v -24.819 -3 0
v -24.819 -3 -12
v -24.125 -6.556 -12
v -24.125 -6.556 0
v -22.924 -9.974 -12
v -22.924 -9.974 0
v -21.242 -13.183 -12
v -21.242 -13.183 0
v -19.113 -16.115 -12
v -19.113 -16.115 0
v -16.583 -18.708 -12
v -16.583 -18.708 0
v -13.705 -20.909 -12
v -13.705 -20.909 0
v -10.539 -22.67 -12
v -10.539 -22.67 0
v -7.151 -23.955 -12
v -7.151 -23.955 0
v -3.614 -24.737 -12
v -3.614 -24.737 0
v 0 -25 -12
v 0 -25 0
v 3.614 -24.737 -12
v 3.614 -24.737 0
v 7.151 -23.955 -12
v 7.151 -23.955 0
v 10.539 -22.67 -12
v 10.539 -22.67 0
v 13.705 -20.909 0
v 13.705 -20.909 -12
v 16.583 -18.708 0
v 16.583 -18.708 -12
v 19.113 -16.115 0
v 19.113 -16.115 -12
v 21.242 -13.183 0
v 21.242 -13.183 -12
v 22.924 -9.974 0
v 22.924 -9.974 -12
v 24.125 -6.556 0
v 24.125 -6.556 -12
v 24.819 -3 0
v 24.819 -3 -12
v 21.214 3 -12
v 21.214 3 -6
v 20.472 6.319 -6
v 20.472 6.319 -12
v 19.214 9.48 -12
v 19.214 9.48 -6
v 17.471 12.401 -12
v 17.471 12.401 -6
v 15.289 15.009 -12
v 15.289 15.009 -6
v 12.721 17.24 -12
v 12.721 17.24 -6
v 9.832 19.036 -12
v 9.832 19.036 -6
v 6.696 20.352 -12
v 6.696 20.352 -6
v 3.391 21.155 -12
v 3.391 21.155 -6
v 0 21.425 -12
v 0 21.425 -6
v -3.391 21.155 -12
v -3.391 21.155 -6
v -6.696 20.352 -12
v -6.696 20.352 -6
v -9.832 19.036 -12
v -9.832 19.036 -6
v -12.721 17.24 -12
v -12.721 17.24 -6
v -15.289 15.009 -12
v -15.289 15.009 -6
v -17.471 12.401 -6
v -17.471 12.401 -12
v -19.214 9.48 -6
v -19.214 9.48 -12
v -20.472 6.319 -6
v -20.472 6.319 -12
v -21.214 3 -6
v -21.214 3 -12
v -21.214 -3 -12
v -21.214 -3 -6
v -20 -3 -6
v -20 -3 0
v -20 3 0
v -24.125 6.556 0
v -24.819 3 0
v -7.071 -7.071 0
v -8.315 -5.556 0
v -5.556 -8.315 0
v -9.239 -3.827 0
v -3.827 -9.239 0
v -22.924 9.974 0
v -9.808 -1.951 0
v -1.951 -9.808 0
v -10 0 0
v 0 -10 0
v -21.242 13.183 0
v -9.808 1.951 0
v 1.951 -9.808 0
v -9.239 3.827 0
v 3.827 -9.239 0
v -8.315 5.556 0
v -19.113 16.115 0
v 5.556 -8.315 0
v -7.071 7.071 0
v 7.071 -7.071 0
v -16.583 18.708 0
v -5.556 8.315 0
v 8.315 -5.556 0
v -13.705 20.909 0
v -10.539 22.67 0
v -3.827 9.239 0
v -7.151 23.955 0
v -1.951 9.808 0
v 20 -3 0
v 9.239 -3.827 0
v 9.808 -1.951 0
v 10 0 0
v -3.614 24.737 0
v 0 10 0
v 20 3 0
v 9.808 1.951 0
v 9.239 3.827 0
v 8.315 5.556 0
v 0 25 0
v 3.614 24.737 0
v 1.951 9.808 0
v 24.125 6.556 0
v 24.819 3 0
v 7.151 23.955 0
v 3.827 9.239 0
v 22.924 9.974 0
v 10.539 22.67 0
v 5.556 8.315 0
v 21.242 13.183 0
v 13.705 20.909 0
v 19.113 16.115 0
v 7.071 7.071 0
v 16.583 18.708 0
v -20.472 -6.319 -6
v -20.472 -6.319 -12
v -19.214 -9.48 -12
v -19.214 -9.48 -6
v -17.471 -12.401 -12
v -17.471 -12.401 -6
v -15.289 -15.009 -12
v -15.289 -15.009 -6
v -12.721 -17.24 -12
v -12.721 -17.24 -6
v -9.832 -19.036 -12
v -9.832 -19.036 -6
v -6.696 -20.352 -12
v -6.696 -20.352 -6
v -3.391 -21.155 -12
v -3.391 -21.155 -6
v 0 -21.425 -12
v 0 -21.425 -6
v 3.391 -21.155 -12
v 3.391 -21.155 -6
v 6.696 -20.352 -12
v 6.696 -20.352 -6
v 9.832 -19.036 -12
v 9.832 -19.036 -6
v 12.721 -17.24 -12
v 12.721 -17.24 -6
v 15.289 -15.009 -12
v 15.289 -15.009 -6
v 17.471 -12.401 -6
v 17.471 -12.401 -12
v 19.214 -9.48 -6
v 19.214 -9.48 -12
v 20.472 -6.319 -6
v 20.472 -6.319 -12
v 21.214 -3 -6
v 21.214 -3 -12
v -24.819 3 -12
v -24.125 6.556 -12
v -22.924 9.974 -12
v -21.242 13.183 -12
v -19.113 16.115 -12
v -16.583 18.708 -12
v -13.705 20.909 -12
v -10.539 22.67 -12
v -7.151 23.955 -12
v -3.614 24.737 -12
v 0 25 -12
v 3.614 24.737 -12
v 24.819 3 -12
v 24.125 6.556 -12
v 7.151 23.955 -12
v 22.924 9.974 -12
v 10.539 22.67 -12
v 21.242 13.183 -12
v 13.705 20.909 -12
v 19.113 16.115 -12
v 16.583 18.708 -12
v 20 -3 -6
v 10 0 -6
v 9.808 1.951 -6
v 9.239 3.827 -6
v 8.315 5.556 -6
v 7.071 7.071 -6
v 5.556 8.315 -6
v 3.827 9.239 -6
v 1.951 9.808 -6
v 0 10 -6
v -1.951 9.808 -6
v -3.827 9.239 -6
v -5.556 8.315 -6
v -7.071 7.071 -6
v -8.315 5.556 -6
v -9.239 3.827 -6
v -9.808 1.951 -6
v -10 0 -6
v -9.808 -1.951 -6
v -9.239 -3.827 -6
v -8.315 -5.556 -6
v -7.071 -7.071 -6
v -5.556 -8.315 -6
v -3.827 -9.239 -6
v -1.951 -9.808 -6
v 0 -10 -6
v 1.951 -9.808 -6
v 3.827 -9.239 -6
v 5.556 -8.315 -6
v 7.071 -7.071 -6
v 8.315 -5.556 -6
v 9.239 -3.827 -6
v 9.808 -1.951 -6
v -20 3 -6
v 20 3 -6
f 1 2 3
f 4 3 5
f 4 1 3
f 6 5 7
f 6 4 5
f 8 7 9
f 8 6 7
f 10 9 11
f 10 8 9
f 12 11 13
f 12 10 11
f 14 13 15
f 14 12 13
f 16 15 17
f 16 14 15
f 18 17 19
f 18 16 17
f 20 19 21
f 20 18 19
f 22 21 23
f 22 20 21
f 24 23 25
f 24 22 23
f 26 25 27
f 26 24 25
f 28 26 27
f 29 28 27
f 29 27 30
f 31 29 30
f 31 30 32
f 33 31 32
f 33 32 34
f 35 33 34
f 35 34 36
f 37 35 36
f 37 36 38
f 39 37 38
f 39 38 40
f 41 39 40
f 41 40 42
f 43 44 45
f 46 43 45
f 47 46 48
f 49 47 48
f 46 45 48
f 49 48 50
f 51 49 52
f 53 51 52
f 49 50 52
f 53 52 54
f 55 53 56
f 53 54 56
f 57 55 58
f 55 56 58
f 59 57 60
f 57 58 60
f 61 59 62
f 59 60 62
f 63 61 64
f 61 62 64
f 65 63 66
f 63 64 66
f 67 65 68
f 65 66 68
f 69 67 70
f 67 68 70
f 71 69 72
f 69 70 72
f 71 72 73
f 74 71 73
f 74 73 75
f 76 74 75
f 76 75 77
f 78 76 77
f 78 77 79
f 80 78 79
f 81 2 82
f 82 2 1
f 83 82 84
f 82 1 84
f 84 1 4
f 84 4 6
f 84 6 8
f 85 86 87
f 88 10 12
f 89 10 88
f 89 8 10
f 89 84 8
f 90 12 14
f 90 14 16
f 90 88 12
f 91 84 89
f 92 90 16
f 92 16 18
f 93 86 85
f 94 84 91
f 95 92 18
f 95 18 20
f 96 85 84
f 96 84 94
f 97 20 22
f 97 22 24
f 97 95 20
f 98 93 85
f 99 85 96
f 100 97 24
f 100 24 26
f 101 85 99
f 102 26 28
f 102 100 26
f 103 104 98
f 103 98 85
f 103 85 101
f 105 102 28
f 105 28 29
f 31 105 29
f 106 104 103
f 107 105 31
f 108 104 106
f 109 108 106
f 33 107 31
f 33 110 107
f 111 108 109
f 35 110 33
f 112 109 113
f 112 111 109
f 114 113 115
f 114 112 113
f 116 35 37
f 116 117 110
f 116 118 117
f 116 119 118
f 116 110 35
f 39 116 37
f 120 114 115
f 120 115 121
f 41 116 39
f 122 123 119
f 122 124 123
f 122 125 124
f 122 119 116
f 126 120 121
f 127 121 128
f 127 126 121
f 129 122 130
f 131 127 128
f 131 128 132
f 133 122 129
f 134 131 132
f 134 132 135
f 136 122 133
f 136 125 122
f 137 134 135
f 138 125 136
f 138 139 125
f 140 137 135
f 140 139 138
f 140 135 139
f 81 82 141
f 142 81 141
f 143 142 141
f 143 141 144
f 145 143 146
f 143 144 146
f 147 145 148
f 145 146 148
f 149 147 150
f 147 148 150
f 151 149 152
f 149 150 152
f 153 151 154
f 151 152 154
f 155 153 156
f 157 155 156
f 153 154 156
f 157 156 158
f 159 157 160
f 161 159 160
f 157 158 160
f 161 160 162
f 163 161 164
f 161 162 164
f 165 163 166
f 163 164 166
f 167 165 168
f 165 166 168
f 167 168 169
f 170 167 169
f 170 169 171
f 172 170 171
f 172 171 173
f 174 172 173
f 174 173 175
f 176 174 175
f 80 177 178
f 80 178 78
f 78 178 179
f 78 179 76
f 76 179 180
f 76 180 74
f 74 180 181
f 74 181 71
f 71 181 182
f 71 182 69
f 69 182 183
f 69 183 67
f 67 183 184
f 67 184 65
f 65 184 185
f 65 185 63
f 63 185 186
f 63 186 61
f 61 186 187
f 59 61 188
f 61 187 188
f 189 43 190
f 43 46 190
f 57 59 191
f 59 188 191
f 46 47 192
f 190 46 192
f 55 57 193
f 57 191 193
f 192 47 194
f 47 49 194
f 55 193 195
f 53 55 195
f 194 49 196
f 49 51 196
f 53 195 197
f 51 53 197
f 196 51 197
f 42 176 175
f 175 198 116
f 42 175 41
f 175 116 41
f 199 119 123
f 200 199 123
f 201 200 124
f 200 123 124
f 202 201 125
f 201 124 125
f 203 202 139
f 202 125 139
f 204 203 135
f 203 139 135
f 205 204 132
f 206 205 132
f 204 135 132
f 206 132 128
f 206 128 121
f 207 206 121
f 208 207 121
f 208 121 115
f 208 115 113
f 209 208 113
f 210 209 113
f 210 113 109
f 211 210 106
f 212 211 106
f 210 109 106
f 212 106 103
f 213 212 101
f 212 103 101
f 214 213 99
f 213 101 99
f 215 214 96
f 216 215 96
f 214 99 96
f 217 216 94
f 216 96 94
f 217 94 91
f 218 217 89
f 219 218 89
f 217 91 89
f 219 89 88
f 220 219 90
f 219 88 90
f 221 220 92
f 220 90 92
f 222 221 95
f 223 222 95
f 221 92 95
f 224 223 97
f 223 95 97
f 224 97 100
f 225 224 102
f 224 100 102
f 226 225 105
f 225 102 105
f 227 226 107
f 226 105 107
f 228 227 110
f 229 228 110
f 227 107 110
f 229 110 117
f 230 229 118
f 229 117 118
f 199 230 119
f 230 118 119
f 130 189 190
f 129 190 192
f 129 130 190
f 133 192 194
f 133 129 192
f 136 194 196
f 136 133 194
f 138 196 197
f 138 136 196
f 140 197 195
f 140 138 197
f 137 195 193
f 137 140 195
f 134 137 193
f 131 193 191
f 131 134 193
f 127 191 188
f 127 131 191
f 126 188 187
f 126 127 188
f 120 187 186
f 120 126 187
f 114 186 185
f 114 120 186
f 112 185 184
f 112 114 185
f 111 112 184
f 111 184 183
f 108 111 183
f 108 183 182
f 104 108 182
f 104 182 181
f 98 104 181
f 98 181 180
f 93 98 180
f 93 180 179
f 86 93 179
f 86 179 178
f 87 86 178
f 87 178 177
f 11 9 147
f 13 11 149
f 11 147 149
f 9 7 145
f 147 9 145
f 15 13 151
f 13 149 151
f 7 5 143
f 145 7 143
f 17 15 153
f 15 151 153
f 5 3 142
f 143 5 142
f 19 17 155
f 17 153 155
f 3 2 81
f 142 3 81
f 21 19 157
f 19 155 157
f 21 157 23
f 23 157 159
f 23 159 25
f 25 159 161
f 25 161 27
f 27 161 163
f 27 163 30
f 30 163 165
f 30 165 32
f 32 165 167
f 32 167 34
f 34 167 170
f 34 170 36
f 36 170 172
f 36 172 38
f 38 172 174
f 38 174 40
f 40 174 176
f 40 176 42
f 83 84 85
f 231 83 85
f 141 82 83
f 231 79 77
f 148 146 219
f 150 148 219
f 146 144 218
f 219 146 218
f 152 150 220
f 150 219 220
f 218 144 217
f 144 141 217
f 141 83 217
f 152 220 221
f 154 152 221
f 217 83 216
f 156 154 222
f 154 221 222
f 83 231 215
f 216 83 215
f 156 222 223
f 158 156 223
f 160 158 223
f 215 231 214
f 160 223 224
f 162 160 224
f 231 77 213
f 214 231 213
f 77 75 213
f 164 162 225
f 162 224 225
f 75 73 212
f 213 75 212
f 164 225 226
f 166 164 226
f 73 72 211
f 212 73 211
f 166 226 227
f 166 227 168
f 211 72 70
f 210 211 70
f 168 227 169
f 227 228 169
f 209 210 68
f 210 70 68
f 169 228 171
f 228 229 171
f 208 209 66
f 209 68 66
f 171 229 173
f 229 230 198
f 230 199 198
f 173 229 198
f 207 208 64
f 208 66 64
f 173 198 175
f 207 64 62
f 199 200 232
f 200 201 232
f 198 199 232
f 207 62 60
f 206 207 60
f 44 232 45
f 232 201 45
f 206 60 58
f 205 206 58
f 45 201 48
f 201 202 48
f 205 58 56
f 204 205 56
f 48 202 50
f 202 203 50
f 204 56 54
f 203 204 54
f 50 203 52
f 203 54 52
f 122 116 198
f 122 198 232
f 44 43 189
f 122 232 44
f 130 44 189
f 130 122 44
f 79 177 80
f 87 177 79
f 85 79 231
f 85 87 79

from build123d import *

# Parameters (mm, degrees)
F0_R     = 21.4249
F0_R_2   = 15
F0_R_3   = 10
F1_DEPTH = 6
F0_R_4   = 25
F2_DEPTH = 12
F4_W     = 10
F4_H     = 6
F5_DEPTH = 25


with BuildPart() as f1:
    # F0 (on Top) → F1 (new body)
    with BuildSketch(Plane.XY):
        Circle(F0_R)
        Circle(F0_R_2, mode=Mode.SUBTRACT)
        Circle(F0_R_2)
        Circle(F0_R_3, mode=Mode.SUBTRACT)
    extrude(amount=-F1_DEPTH)

    # F0 (on Top) → F2 (join)
    with BuildSketch(Plane.XY):
        Circle(F0_R_4)
        Circle(F0_R, mode=Mode.SUBTRACT)
    extrude(amount=-F2_DEPTH)

    # F4 (on Top) → F5 (cut)
    with BuildSketch(Plane.XY):
        with Locations((25, 0)):
            Rectangle(F4_W, F4_H)
        with Locations((-25, 0)):
            Rectangle(F4_W, F4_H)
    extrude(amount=-F5_DEPTH, mode=Mode.SUBTRACT)


solid = f1.part
